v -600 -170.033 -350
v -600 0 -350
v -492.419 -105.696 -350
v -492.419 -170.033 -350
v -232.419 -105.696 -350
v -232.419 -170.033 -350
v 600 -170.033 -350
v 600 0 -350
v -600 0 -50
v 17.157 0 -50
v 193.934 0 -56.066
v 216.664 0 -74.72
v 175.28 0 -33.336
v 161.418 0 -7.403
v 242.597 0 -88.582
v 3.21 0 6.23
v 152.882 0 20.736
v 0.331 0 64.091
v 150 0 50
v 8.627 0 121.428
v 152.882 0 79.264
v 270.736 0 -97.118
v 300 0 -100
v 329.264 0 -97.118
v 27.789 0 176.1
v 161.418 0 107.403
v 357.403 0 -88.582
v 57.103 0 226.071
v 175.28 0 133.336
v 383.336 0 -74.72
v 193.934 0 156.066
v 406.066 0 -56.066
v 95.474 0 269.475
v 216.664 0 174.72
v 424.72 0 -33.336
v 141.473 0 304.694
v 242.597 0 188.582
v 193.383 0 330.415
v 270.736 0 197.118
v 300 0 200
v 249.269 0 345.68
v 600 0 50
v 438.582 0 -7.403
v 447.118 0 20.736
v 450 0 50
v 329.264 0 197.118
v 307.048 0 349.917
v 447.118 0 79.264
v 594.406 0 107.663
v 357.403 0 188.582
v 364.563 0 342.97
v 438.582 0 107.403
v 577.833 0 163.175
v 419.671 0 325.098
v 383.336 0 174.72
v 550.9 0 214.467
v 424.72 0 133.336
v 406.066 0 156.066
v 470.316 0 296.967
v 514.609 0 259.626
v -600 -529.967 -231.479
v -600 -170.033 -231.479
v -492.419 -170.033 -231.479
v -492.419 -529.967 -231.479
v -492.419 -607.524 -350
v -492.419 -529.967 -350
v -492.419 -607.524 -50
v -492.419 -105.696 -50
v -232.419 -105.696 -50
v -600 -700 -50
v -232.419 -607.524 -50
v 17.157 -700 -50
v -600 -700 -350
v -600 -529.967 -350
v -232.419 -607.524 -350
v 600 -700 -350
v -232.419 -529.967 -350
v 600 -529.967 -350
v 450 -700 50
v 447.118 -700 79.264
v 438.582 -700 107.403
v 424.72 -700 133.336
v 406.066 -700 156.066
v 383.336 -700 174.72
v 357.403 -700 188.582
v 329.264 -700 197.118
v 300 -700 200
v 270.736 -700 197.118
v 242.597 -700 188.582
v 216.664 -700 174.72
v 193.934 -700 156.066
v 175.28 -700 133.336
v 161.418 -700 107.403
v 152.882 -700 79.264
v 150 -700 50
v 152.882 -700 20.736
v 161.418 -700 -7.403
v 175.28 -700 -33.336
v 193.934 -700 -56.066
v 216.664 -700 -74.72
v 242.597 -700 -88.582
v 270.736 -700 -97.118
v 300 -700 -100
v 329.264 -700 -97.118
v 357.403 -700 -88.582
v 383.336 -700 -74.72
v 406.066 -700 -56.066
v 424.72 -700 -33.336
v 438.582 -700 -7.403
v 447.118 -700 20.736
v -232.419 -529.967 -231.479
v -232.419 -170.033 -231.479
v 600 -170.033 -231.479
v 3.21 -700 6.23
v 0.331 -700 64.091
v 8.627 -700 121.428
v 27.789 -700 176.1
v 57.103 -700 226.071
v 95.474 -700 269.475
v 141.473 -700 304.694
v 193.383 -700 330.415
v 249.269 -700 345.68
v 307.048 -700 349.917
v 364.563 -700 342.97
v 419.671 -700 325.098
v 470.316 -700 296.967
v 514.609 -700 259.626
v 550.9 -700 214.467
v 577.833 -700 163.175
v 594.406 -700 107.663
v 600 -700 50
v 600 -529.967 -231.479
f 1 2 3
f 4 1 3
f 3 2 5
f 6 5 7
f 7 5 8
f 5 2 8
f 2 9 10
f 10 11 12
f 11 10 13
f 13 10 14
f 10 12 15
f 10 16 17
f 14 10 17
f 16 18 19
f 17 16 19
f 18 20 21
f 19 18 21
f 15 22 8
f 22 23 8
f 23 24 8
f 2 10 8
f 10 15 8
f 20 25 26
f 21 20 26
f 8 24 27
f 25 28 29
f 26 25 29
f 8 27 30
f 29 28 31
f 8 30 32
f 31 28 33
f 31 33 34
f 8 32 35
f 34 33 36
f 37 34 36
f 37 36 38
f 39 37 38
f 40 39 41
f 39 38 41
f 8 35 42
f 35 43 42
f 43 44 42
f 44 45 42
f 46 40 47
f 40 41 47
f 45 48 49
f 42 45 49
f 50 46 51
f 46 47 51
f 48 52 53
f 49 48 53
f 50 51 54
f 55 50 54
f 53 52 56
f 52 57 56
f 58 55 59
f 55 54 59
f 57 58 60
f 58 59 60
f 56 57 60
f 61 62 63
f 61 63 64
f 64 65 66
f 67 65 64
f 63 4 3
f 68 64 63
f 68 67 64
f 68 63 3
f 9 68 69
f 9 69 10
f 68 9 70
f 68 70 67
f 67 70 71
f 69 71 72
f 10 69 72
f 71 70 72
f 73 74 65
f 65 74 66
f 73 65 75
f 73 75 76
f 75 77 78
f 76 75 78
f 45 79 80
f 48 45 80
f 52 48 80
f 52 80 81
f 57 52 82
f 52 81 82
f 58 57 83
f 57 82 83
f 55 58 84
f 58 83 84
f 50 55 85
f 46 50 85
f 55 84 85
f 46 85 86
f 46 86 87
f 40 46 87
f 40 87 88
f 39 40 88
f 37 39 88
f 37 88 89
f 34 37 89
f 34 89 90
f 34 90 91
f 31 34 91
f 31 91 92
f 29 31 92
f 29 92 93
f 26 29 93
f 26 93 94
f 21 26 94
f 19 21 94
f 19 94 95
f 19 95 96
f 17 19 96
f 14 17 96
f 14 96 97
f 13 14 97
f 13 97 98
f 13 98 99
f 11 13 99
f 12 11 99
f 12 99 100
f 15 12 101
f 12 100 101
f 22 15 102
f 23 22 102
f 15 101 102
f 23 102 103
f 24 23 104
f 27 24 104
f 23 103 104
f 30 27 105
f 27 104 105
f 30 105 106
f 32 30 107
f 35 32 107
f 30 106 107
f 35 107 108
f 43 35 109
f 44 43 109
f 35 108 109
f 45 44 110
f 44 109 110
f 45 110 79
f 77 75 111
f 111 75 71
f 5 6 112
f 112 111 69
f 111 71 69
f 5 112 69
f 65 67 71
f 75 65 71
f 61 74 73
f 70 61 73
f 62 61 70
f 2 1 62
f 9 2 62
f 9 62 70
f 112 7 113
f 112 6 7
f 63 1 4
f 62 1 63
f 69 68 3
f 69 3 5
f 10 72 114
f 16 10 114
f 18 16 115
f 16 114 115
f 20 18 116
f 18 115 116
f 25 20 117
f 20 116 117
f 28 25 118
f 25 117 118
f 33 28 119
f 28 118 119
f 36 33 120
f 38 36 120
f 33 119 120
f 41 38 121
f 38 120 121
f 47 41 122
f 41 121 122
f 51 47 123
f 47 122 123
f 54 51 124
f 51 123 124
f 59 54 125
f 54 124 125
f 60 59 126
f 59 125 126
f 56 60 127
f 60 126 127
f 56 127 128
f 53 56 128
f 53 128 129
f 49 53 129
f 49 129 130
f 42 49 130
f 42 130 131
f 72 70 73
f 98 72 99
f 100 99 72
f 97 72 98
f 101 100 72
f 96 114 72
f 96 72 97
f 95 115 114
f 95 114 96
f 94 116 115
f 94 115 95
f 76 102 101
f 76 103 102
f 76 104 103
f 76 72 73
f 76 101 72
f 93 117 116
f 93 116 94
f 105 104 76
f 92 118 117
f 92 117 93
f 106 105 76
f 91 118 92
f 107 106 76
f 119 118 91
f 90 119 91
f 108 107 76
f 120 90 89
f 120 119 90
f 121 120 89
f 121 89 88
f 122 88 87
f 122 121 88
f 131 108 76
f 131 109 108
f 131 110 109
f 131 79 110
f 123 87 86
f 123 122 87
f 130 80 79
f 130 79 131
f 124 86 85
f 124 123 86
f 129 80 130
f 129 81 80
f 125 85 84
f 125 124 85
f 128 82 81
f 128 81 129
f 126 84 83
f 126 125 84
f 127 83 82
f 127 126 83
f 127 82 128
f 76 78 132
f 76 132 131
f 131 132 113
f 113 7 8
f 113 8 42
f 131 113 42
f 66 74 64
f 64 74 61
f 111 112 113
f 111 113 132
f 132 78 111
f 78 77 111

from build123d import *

# Parameters (mm, degrees)
F0_W      = 1200
F0_H      = 700
F1_DEPTH  = 700
F3_DEPTH  = 700.001
F4_R      = 150
F5_DEPTH  = 700.001
F6_W      = 260
F6_H      = 398.8438928255
F7_DEPTH  = 300.001
F8_W      = 260
F8_H      = 102.9841262038
F9_DEPTH  = 300.001
F10_W     = 359.9333584309
F10_H     = 237.0417833328
F11_DEPTH = 1200.001


with BuildPart() as f1:
    # F0 (on Front) → F1 (new body)
    with BuildSketch(Plane.XZ):
        Rectangle(F0_W, F0_H)
    extrude(amount=F1_DEPTH)

    # F2 (on face) → F3 (cut, through all)
    with BuildSketch(Plane.XZ.offset(700)):
        with BuildLine():
            Line((-600, -50), (17.1572875254, -50))
            ThreePointArc((17.1572875254, -50), (55.0510257217, 223.2050807569), (300, 350))
            Line((300, 350), (-600, 350))
            Line((-600, 350), (-600, -50))
        make_face()
        with BuildLine():
            ThreePointArc((300, 350), (512.132034356, 262.132034356), (600, 50))
            Line((600, 50), (600, 350))
            Line((600, 350), (300, 350))
        make_face()
    extrude(amount=-F3_DEPTH, mode=Mode.SUBTRACT)

    # F4 (on face) → F5 (cut, through all)
    with BuildSketch(Plane.XZ.offset(700)):
        with Locations((300, 50)):
            Circle(F4_R)
    extrude(amount=-F5_DEPTH, mode=Mode.SUBTRACT)

    # F6 (on face) → F7 (cut, through all)
    with BuildSketch(Plane.XY.offset(-50)):
        with Locations((-362.4188005924, -305.1174879074)):
            Rectangle(F6_W, F6_H)
    extrude(amount=-F7_DEPTH, mode=Mode.SUBTRACT)

    # F8 (on face) → F9 (cut, through all)
    with BuildSketch(Plane.XY.offset(-50)):
        with Locations((-362.4188005924, -556.0314974221)):
            Rectangle(F8_W, F8_H)
    extrude(amount=-F9_DEPTH, mode=Mode.SUBTRACT)

    # F10 (on face) → F11 (cut, through all)
    with BuildSketch(Plane(origin=(-600, 0, 0), x_dir=(0, -1, 0), z_dir=(-1, 0, 0))):
        with Locations((350, -350)):
            Rectangle(F10_W, F10_H)
    extrude(amount=-F11_DEPTH, mode=Mode.SUBTRACT)


solid = f1.part
